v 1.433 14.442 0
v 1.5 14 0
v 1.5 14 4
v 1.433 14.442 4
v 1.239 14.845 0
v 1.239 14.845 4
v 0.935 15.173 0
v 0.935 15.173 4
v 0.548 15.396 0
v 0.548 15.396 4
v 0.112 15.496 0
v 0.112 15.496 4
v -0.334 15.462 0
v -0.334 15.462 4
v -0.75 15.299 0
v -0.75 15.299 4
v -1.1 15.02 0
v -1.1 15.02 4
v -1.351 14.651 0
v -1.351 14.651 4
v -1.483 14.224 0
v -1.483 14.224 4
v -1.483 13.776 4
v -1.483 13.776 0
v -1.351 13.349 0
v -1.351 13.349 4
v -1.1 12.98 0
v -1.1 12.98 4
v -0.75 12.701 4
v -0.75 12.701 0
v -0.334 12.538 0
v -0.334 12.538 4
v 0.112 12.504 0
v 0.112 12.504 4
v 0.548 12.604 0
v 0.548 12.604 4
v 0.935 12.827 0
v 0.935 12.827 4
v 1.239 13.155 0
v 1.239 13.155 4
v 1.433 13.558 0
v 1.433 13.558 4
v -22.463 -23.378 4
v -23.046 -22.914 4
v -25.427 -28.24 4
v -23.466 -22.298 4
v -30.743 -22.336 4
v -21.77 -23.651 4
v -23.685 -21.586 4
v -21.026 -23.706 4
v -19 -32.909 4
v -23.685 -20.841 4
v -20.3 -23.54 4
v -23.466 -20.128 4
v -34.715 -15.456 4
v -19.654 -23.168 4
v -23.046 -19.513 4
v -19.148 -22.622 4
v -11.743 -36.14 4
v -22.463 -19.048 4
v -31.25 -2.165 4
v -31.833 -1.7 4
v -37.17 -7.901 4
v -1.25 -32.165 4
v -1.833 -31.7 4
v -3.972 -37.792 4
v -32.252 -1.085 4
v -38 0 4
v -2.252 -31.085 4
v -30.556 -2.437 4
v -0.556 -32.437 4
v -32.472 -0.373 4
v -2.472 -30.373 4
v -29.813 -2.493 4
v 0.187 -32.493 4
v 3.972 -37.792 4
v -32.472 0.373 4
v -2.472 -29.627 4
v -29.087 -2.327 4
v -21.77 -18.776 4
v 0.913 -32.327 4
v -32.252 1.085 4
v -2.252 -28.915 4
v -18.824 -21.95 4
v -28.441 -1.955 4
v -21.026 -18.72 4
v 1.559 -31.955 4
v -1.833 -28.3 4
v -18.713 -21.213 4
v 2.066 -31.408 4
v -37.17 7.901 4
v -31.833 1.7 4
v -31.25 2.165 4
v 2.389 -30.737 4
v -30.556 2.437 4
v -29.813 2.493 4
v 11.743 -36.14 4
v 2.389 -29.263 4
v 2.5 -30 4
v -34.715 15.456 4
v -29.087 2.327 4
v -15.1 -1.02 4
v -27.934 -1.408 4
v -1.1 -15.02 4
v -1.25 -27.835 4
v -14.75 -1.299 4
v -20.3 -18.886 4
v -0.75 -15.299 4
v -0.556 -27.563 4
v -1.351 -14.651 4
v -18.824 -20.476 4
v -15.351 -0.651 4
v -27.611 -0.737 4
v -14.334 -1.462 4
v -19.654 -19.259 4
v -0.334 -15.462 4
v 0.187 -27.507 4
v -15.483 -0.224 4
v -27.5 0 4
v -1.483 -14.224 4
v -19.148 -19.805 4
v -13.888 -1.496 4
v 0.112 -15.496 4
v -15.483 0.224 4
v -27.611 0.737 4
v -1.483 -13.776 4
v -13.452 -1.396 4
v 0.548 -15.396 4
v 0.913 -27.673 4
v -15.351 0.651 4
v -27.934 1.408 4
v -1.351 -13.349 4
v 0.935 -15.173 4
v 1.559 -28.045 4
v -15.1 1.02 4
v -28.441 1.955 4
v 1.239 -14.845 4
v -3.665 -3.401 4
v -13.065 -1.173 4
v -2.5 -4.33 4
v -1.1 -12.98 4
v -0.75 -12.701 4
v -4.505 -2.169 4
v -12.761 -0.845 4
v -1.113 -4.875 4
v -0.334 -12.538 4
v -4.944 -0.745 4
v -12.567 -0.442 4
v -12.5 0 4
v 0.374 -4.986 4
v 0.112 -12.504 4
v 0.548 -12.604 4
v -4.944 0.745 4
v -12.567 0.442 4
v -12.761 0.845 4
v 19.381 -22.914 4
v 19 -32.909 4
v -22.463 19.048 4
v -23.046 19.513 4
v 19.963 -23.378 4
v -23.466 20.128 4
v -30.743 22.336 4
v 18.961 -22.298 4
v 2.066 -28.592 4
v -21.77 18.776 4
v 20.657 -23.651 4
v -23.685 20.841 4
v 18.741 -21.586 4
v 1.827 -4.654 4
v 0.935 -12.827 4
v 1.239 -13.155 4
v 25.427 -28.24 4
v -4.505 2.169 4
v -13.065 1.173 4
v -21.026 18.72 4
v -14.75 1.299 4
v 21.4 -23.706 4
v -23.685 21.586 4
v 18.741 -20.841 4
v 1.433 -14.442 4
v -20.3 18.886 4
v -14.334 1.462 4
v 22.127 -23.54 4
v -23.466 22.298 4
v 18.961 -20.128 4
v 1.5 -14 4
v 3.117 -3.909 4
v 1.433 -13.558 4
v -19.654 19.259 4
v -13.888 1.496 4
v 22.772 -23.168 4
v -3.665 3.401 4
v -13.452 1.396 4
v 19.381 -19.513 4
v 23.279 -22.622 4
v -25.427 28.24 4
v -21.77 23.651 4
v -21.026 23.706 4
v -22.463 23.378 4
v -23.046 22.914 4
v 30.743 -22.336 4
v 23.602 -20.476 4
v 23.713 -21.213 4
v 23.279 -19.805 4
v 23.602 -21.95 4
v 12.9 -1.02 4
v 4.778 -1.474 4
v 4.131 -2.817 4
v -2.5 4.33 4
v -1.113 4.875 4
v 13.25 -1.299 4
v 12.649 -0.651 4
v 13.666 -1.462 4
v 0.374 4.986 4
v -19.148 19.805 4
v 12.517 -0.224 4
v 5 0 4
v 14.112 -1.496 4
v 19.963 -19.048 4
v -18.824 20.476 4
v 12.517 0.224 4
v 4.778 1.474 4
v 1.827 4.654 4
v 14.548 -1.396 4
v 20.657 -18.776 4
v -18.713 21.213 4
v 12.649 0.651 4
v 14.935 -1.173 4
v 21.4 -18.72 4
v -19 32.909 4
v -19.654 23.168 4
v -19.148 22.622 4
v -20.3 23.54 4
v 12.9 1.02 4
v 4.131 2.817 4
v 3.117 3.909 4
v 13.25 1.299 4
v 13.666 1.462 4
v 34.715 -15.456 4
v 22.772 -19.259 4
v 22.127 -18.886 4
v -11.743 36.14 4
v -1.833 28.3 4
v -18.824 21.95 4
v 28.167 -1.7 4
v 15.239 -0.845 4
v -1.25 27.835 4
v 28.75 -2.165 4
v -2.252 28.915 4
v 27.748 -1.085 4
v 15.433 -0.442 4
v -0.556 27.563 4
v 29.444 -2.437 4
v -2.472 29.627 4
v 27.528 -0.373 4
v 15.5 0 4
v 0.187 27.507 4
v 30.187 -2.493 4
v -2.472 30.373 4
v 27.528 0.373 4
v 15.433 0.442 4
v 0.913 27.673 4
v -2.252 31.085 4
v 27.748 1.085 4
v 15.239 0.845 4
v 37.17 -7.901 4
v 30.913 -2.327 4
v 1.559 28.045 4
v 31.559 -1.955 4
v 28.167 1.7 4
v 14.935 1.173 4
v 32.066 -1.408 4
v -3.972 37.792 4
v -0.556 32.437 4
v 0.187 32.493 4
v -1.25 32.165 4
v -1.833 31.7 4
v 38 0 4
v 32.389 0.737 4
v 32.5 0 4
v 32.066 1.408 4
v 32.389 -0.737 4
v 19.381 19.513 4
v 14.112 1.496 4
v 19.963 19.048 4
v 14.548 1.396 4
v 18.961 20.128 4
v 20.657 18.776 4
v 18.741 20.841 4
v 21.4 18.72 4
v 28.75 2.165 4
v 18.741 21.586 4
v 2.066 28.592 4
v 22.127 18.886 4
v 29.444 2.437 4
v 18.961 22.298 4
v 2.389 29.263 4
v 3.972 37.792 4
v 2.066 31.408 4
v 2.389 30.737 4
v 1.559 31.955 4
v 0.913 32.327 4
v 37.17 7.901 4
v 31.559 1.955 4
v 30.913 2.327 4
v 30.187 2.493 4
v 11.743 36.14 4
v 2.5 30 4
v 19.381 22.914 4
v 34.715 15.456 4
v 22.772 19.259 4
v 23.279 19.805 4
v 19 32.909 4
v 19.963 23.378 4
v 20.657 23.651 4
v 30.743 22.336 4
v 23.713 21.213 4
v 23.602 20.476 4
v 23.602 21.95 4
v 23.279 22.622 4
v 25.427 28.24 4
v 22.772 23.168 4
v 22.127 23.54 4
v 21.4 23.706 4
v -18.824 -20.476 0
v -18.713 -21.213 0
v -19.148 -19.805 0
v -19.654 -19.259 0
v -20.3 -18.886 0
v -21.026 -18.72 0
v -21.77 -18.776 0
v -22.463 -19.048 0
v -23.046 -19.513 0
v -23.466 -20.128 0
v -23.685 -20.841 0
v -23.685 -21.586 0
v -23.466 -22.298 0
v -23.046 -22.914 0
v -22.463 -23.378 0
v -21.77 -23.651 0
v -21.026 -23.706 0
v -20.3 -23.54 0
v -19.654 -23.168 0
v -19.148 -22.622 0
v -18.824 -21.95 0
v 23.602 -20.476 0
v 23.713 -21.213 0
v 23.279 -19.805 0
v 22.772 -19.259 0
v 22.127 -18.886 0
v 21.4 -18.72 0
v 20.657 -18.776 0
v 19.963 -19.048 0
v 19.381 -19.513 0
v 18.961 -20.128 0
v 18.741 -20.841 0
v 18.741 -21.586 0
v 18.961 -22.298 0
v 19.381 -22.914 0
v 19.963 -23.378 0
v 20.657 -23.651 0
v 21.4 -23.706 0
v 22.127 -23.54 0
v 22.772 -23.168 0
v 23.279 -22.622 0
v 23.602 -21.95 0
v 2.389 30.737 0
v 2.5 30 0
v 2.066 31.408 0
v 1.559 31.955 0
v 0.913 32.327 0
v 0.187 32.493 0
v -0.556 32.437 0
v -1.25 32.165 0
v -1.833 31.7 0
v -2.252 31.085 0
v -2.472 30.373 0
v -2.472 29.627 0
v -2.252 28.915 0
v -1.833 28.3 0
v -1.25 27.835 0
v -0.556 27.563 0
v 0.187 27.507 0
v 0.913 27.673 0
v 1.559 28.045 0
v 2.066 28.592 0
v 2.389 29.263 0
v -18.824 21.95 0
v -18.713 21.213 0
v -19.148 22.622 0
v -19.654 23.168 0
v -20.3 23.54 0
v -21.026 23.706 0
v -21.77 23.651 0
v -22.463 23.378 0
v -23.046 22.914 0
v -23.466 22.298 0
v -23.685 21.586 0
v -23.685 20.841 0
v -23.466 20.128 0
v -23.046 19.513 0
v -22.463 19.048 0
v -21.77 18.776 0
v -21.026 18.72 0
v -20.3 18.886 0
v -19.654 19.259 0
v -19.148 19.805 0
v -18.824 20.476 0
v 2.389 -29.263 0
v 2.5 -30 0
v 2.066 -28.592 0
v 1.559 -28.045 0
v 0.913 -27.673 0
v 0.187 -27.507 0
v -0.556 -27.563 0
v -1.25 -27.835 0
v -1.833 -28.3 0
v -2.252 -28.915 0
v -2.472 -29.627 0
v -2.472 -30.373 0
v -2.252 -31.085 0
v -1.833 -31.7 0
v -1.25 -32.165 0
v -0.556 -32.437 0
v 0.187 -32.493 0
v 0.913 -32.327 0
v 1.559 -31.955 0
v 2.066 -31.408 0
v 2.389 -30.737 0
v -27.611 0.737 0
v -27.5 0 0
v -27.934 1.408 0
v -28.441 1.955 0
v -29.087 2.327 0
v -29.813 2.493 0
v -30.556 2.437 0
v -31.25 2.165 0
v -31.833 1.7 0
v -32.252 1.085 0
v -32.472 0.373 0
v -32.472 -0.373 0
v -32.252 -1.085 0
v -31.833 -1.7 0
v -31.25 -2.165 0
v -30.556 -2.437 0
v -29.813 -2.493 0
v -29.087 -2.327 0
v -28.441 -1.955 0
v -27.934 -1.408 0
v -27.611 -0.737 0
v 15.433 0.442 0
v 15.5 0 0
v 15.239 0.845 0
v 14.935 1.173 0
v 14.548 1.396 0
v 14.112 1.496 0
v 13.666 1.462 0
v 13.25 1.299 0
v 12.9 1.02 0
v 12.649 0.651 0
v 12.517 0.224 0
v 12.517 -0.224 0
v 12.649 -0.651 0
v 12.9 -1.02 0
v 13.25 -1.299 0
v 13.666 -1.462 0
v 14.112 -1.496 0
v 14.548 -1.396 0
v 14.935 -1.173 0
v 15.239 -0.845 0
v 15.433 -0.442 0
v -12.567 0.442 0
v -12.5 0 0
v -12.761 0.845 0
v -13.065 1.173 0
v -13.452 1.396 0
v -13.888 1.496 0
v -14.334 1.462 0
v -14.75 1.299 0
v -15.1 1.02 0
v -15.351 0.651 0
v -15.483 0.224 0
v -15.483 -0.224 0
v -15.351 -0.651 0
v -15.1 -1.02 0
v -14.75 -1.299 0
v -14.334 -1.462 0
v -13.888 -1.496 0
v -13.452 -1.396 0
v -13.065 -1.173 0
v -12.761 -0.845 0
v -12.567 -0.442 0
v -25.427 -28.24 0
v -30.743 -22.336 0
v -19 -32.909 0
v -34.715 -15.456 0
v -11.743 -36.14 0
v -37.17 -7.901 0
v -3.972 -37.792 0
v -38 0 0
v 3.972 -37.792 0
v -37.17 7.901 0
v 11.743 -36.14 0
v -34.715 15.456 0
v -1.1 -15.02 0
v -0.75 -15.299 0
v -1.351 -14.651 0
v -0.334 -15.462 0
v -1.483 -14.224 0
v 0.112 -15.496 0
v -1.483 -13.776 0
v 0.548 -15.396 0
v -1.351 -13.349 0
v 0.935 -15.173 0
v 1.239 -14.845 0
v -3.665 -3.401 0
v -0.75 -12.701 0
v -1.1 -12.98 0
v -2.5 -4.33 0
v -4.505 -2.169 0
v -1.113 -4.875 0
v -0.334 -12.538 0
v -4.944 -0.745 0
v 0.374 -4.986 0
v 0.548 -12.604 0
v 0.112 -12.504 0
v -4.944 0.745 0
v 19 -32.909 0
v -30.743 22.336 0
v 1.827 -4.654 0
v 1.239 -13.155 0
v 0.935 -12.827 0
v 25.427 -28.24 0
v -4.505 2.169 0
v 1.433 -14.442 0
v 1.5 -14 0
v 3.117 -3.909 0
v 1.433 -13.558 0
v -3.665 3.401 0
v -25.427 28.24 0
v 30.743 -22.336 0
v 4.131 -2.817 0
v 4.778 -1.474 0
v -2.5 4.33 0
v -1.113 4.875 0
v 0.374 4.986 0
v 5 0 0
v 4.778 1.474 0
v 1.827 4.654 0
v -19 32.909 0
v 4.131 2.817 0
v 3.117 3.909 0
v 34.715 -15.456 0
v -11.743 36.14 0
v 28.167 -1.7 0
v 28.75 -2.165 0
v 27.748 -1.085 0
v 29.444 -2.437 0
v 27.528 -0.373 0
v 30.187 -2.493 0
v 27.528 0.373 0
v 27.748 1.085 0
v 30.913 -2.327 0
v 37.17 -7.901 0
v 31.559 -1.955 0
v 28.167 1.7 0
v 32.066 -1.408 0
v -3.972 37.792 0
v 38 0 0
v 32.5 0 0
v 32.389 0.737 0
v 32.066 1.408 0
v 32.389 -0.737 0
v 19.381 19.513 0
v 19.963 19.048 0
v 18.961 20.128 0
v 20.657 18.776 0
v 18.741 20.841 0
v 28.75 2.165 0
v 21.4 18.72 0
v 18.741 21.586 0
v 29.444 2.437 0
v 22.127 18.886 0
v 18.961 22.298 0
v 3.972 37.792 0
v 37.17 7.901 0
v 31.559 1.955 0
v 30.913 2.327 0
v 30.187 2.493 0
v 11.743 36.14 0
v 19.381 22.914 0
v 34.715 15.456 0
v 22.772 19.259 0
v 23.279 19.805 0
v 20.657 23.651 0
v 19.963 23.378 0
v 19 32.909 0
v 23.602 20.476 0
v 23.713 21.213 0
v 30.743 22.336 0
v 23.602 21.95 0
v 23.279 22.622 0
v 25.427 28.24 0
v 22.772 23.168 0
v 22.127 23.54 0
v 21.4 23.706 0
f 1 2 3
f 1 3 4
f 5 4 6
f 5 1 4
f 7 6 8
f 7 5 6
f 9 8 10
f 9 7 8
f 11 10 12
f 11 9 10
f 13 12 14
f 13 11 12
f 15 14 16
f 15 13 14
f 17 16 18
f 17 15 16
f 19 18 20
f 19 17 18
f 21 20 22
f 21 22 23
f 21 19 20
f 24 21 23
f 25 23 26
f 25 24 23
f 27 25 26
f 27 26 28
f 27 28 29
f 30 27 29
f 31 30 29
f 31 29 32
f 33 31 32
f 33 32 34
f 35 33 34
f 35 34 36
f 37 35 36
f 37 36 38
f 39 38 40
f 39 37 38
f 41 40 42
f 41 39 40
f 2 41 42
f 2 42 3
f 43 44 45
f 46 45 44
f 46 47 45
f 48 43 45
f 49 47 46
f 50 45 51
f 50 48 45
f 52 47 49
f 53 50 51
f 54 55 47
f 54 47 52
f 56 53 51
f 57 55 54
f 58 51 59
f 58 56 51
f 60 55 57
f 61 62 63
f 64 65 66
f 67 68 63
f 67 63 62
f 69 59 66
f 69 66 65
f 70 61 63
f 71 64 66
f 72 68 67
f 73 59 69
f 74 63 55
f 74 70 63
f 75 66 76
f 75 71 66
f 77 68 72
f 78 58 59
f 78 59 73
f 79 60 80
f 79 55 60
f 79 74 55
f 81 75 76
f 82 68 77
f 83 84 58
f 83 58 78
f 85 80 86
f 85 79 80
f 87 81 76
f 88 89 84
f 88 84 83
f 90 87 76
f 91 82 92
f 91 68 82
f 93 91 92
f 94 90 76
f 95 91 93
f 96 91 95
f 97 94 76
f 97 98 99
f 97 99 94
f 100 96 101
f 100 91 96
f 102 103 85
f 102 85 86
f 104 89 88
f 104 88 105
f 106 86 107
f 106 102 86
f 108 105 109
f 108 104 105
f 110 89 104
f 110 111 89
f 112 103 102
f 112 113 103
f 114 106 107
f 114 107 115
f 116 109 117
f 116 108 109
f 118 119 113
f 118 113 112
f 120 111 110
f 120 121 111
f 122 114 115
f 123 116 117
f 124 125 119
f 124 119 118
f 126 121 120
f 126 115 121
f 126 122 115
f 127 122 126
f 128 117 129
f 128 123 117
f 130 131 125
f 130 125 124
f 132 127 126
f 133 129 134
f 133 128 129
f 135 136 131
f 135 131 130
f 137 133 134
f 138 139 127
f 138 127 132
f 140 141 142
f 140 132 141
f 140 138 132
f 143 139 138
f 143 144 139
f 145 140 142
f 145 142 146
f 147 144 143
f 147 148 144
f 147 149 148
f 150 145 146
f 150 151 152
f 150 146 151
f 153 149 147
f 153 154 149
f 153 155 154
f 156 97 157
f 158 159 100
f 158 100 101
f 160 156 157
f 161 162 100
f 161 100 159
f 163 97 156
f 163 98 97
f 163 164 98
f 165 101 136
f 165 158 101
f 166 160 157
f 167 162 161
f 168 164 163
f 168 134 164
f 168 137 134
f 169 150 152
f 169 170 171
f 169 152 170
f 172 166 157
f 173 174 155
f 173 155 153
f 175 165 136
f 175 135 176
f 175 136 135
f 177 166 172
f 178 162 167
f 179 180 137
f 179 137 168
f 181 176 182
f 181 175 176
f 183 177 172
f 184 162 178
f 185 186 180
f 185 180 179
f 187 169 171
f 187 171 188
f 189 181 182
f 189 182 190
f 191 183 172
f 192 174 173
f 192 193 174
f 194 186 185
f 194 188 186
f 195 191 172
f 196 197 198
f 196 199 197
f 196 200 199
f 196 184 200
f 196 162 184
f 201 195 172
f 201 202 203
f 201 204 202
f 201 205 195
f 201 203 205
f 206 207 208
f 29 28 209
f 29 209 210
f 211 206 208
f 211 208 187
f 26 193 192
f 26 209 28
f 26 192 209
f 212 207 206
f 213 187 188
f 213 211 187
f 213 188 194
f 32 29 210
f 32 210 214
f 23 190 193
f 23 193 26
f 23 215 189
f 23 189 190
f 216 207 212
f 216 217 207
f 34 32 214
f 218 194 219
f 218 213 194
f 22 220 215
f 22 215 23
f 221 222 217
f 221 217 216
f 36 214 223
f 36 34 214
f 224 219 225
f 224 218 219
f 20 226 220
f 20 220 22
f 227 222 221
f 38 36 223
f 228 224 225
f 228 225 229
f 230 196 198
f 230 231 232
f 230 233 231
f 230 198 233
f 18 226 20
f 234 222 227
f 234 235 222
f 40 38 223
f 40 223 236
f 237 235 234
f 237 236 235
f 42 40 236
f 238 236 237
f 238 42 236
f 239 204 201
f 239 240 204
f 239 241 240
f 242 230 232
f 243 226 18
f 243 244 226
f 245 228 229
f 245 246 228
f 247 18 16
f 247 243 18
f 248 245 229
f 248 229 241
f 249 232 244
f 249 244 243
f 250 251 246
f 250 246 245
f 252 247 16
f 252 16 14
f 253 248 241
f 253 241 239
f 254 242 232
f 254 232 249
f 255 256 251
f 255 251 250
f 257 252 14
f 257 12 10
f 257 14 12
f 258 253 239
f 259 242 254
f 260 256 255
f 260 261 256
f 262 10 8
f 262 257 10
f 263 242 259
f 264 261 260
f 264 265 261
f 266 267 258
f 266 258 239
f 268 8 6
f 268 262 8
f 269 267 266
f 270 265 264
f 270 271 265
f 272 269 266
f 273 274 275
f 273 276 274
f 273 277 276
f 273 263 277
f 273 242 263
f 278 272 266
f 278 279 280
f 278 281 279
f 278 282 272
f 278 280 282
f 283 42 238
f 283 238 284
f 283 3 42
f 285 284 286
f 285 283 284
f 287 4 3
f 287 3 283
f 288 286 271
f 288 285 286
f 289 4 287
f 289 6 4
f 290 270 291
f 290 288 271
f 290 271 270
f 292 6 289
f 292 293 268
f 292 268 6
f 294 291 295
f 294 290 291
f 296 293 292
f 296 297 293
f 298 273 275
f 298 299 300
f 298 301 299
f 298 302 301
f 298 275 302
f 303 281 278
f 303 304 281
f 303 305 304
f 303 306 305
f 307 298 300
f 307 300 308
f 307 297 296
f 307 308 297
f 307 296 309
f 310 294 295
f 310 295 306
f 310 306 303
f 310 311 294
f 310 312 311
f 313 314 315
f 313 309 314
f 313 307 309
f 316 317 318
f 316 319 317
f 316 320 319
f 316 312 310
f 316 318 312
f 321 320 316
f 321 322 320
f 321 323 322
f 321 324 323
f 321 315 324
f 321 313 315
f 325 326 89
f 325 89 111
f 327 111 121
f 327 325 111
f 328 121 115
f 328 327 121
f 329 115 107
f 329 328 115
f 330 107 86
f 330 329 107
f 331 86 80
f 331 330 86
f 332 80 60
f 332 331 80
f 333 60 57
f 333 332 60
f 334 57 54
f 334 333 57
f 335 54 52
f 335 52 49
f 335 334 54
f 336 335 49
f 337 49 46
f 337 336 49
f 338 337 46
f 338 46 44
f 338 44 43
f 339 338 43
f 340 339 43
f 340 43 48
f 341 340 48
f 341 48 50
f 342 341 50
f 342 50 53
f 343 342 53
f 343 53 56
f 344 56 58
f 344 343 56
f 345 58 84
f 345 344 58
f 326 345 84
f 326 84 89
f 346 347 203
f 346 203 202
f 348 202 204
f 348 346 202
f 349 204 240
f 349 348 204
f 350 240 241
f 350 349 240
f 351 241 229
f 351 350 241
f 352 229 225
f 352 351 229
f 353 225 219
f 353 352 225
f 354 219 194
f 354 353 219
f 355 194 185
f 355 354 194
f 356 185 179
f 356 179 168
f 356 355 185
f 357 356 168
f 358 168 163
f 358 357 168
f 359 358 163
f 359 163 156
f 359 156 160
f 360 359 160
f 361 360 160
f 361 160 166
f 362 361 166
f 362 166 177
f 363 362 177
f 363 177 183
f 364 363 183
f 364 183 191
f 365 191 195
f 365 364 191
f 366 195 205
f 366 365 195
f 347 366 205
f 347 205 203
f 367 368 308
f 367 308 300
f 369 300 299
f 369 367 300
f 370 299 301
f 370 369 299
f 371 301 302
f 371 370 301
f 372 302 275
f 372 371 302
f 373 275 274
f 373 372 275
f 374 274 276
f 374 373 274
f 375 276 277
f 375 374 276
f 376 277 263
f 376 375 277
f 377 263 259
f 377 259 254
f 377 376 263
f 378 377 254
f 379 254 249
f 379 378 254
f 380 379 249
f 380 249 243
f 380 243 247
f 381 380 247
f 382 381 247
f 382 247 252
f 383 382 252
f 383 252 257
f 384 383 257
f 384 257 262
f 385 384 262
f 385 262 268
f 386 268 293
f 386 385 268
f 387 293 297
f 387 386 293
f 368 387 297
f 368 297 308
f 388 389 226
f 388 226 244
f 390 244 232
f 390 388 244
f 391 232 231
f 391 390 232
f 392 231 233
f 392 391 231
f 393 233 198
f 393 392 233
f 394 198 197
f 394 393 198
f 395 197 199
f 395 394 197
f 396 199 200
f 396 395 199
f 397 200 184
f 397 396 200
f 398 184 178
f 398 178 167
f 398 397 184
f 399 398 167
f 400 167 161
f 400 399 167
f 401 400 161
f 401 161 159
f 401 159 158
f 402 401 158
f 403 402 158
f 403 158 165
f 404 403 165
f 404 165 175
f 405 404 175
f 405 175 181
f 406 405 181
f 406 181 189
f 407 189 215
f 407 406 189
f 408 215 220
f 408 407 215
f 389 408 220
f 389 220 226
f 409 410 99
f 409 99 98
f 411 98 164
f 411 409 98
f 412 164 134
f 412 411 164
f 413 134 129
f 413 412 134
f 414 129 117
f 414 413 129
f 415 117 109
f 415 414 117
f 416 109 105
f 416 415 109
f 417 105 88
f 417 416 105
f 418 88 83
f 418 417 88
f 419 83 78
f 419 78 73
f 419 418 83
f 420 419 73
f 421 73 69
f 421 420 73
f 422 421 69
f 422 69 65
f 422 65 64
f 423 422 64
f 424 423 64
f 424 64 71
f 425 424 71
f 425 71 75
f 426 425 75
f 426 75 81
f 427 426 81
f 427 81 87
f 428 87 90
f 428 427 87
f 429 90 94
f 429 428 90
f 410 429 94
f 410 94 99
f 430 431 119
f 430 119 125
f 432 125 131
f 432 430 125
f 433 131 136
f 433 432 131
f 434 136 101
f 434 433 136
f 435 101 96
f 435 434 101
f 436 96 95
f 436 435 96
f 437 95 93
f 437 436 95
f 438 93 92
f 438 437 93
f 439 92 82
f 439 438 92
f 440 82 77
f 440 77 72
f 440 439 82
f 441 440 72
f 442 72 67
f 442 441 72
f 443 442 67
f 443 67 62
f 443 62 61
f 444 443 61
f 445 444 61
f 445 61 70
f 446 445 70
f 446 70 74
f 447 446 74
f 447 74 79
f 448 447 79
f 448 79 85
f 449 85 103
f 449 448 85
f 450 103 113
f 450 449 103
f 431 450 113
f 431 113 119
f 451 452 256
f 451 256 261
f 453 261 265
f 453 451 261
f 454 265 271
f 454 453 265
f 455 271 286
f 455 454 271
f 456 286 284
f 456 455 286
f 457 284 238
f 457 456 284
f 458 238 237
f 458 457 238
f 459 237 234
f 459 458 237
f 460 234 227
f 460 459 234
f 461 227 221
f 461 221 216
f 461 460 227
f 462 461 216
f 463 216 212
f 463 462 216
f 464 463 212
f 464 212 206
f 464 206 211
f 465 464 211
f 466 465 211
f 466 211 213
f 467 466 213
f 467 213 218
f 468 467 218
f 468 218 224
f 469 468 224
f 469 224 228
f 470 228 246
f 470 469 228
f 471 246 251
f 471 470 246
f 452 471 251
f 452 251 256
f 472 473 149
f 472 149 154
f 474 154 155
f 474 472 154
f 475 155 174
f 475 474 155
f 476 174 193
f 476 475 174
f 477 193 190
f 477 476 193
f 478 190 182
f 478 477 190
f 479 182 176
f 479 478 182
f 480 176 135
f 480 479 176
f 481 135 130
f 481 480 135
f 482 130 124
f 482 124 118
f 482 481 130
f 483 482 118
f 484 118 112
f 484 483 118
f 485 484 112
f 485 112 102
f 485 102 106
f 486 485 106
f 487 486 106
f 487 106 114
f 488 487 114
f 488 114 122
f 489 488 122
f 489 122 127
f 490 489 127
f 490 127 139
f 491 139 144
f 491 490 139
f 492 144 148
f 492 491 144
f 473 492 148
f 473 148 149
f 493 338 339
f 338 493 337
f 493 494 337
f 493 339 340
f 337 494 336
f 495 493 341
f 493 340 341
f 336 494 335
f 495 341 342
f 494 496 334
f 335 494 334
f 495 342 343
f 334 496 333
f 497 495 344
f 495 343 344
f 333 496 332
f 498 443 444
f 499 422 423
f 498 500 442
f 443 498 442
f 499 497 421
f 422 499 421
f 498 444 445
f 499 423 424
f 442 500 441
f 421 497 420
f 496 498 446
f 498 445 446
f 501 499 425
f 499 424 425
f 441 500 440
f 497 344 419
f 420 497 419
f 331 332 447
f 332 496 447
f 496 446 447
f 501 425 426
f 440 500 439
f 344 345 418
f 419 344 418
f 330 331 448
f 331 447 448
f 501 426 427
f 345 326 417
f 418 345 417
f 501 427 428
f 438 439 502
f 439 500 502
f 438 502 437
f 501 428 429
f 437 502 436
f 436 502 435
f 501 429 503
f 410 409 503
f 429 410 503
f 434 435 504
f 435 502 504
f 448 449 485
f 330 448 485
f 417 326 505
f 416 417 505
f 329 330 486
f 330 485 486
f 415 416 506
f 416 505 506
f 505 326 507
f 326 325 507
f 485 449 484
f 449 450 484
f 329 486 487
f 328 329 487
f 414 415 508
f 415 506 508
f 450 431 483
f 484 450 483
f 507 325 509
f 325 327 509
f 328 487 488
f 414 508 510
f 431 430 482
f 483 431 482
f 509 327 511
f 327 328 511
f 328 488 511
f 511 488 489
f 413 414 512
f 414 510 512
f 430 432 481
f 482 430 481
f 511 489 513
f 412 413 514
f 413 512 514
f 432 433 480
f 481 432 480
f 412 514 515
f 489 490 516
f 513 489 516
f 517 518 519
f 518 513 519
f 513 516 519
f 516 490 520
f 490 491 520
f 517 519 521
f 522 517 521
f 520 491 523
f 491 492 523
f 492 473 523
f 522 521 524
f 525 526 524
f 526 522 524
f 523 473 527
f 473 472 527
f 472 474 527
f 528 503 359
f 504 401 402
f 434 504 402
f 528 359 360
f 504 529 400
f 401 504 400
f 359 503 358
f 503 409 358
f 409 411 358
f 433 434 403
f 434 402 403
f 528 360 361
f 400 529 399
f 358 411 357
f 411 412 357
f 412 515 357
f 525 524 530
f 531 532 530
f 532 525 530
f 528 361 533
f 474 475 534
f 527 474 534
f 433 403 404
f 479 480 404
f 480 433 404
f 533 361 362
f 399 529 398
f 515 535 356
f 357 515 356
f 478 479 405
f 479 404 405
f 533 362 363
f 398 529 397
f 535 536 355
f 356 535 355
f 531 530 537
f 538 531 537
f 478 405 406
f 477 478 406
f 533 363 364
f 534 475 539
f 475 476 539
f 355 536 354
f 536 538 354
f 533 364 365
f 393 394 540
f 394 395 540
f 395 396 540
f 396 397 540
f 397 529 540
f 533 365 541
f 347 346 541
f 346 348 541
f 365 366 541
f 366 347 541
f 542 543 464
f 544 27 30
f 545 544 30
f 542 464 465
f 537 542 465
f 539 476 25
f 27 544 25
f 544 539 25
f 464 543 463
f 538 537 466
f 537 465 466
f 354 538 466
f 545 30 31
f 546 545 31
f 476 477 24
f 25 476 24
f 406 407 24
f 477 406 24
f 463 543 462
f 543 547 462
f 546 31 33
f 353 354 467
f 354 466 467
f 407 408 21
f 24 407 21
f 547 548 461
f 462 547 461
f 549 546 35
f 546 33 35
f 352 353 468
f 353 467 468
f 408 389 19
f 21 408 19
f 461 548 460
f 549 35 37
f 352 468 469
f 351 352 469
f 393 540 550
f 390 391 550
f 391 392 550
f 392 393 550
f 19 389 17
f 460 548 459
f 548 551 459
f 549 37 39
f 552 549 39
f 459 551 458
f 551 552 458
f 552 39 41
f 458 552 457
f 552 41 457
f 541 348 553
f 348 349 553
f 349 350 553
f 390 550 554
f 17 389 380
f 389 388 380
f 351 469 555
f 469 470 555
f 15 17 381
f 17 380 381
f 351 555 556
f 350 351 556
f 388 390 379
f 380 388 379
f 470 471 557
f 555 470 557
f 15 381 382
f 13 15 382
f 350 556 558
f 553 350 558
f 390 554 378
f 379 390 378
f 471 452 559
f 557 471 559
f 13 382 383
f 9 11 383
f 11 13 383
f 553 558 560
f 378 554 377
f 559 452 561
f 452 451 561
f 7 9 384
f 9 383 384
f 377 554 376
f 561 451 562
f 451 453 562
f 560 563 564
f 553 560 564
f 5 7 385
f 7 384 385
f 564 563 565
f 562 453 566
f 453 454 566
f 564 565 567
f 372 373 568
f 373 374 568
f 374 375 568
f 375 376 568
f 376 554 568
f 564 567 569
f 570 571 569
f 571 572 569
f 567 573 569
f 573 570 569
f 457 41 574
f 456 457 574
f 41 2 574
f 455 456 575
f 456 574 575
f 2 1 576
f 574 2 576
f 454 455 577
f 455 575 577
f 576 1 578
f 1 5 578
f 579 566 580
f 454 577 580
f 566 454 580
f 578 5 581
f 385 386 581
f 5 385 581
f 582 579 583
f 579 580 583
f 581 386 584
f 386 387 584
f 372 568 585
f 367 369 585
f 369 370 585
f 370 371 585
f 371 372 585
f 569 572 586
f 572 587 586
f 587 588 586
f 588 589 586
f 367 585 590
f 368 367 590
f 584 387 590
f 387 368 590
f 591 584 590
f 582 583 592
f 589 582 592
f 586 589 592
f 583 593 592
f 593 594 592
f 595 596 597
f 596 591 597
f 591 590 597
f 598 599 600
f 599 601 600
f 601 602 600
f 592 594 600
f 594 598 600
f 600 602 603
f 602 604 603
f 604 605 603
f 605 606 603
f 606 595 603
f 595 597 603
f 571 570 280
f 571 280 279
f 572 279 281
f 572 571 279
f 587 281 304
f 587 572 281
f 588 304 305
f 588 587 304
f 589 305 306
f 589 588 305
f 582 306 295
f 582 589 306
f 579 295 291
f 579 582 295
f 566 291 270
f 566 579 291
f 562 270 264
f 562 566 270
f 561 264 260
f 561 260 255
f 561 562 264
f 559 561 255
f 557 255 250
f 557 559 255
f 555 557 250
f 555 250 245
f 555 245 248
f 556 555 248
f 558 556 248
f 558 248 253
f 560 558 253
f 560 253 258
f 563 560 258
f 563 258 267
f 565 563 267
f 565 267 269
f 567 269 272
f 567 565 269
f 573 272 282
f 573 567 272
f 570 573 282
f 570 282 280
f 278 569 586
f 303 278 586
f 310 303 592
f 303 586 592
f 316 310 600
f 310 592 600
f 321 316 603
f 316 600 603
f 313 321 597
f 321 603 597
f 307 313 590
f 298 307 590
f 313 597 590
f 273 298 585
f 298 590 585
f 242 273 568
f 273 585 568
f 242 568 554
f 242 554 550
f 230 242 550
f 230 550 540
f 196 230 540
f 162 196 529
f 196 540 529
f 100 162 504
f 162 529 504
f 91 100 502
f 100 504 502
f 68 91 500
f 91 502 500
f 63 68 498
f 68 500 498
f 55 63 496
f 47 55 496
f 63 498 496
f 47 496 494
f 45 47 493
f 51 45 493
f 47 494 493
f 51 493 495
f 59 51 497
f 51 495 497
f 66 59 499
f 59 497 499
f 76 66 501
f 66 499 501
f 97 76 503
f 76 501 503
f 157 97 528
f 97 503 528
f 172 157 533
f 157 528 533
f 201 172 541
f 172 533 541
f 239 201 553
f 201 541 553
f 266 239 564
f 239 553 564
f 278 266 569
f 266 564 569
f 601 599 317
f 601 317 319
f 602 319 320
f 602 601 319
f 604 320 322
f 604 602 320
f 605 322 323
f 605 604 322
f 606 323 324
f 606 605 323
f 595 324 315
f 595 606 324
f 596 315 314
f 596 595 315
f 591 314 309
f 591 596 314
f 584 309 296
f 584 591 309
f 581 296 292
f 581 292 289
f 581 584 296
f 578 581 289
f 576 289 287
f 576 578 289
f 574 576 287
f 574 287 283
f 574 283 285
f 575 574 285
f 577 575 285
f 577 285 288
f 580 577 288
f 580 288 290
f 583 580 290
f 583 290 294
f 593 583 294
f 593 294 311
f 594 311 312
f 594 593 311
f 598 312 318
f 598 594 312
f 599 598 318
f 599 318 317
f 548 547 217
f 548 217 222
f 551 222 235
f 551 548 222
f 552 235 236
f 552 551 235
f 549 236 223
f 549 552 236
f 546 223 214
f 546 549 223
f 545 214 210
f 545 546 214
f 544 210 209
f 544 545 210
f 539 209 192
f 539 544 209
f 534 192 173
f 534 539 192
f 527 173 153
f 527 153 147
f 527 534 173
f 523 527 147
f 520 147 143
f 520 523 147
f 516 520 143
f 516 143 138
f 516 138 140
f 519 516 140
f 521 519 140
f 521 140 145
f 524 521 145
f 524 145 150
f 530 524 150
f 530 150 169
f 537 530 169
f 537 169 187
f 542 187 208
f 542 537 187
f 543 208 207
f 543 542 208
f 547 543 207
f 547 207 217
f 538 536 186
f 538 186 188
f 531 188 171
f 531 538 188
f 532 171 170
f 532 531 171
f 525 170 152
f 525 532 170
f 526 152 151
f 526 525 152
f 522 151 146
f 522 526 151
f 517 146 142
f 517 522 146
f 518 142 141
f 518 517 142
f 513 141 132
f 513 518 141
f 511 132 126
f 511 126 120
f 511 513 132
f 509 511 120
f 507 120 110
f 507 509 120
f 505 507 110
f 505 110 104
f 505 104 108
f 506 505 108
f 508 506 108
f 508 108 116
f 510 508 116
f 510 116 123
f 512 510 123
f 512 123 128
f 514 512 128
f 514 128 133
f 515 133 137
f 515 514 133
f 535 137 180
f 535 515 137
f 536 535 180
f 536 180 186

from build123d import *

# Parameters (mm, degrees)
SKETCH_1_R      = 38
SKETCH_1_R_2    = 5
SKETCH_1_R_3    = 2.5
SKETCH_1_R_4    = 1.5
EXTRUDE_2_DEPTH = 4


with BuildPart() as part:
    # 草图1 → 凸台-拉伸2 (new body)
    with BuildSketch(Plane.XY):
        Circle(SKETCH_1_R)
        Circle(SKETCH_1_R_2, mode=Mode.SUBTRACT)
        with Locations((0, 30)):
            Circle(SKETCH_1_R_3, mode=Mode.SUBTRACT)
        with Locations((21.213203436, 21.213203436)):
            Circle(SKETCH_1_R_3, mode=Mode.SUBTRACT)
        with Locations((30, 0)):
            Circle(SKETCH_1_R_3, mode=Mode.SUBTRACT)
        with Locations((21.213203436, -21.213203436)):
            Circle(SKETCH_1_R_3, mode=Mode.SUBTRACT)
        with Locations((0, -30)):
            Circle(SKETCH_1_R_3, mode=Mode.SUBTRACT)
        with Locations((-21.213203436, -21.213203436)):
            Circle(SKETCH_1_R_3, mode=Mode.SUBTRACT)
        with Locations((-30, 0)):
            Circle(SKETCH_1_R_3, mode=Mode.SUBTRACT)
        with Locations((-21.213203436, 21.213203436)):
            Circle(SKETCH_1_R_3, mode=Mode.SUBTRACT)
        with Locations((0, 14)):
            Circle(SKETCH_1_R_4, mode=Mode.SUBTRACT)
        with Locations((14, 0)):
            Circle(SKETCH_1_R_4, mode=Mode.SUBTRACT)
        with Locations((0, -14)):
            Circle(SKETCH_1_R_4, mode=Mode.SUBTRACT)
        with Locations((-14, 0)):
            Circle(SKETCH_1_R_4, mode=Mode.SUBTRACT)
    extrude(amount=EXTRUDE_2_DEPTH)


solid = part.part
